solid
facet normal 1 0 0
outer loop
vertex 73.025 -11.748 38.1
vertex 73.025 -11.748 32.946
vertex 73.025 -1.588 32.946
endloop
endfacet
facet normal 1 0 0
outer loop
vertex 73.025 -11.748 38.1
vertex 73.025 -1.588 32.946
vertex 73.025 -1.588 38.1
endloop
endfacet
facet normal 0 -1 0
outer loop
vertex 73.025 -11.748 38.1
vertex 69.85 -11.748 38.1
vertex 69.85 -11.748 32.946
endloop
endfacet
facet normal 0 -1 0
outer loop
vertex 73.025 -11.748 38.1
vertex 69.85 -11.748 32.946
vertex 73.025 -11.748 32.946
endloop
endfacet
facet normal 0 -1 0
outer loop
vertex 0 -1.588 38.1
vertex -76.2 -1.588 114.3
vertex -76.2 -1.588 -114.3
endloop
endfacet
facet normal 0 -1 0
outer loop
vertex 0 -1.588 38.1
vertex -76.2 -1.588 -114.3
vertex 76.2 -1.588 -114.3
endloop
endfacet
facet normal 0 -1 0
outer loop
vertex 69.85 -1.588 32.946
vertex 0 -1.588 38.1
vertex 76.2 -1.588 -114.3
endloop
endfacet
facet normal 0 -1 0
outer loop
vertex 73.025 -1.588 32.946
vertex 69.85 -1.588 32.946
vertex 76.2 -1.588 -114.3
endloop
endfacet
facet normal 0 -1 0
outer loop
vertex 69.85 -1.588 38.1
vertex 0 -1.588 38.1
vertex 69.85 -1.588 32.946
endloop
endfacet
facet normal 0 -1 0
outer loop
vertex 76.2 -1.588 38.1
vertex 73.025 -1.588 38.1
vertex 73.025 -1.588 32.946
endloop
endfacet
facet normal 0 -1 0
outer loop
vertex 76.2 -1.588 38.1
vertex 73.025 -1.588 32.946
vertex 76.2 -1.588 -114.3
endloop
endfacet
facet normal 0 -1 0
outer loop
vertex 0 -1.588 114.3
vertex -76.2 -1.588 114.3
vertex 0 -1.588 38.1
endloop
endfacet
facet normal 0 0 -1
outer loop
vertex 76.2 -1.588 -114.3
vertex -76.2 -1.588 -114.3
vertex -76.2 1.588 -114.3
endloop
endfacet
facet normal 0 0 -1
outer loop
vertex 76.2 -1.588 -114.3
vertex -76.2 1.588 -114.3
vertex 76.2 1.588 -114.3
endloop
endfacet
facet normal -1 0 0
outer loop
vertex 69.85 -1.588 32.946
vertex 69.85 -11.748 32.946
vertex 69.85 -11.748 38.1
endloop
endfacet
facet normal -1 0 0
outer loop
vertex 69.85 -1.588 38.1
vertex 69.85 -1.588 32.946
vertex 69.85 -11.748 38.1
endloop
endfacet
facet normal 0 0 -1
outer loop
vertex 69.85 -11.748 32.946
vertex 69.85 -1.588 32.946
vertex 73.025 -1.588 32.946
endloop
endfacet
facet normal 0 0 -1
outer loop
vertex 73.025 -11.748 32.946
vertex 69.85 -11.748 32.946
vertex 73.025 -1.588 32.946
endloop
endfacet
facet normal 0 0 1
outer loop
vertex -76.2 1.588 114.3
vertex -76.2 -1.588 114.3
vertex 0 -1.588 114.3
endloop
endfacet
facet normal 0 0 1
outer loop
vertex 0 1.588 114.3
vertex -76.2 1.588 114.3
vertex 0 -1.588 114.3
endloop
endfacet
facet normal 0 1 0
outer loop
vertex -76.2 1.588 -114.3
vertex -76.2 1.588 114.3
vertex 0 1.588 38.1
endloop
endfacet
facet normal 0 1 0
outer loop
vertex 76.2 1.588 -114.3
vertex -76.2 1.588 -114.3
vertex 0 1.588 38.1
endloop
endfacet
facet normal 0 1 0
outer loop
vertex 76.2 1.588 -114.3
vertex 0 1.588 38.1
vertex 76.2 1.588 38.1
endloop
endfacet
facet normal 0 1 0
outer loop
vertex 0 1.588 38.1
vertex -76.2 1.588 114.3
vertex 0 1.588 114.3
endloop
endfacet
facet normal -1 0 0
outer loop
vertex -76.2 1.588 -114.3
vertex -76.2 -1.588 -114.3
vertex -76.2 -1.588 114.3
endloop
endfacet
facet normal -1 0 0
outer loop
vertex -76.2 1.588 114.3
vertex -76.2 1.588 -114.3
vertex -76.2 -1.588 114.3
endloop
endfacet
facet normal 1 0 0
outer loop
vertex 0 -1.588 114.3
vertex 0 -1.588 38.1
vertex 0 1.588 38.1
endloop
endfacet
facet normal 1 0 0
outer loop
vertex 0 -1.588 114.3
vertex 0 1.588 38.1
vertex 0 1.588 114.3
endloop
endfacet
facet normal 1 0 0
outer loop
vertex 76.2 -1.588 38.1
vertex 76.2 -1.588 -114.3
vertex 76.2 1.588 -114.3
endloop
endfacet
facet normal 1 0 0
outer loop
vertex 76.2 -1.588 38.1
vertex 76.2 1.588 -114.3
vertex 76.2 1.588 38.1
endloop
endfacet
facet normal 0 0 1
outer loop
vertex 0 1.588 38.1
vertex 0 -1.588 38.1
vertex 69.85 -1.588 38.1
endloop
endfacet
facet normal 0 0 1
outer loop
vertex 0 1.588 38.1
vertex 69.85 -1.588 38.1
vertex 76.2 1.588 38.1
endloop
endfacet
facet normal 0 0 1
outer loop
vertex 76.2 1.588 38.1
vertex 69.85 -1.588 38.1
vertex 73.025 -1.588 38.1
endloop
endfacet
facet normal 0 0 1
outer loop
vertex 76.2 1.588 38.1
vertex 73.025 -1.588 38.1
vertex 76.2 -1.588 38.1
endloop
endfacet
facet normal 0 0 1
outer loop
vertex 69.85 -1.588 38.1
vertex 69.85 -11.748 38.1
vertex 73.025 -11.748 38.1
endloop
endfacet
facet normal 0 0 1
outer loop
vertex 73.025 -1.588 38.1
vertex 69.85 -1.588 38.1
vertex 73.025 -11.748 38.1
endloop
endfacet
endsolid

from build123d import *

# Parameters (mm, degrees)
F0_W     = 152.4
F0_H     = 228.6
F1_DEPTH = 1.5875
F2_W     = 76.2
F2_H     = 76.2
F3_DEPTH = 3.176
F4_W     = 3.175
F4_H     = 5.1537374914
F5_DEPTH = 10.16


with BuildPart() as f1:
    # F0 (on Front) → F1 (new body, symmetric)
    with BuildSketch(Plane.XZ):
        Rectangle(F0_W, F0_H)
    extrude(amount=F1_DEPTH, both=True)

    # F2 (on face) → F3 (cut, through all)
    with BuildSketch(Plane.XZ.offset(1.5875)):
        with Locations((38.1, 76.2)):
            Rectangle(F2_W, F2_H)
    extrude(amount=-F3_DEPTH, mode=Mode.SUBTRACT)

    # F4 (on face) → F5 (join)
    with BuildSketch(Plane.XZ.offset(1.5875)):
        with Locations((71.4375, 35.5231312543)):
            Rectangle(F4_W, F4_H)
    extrude(amount=F5_DEPTH)


solid = f1.part
